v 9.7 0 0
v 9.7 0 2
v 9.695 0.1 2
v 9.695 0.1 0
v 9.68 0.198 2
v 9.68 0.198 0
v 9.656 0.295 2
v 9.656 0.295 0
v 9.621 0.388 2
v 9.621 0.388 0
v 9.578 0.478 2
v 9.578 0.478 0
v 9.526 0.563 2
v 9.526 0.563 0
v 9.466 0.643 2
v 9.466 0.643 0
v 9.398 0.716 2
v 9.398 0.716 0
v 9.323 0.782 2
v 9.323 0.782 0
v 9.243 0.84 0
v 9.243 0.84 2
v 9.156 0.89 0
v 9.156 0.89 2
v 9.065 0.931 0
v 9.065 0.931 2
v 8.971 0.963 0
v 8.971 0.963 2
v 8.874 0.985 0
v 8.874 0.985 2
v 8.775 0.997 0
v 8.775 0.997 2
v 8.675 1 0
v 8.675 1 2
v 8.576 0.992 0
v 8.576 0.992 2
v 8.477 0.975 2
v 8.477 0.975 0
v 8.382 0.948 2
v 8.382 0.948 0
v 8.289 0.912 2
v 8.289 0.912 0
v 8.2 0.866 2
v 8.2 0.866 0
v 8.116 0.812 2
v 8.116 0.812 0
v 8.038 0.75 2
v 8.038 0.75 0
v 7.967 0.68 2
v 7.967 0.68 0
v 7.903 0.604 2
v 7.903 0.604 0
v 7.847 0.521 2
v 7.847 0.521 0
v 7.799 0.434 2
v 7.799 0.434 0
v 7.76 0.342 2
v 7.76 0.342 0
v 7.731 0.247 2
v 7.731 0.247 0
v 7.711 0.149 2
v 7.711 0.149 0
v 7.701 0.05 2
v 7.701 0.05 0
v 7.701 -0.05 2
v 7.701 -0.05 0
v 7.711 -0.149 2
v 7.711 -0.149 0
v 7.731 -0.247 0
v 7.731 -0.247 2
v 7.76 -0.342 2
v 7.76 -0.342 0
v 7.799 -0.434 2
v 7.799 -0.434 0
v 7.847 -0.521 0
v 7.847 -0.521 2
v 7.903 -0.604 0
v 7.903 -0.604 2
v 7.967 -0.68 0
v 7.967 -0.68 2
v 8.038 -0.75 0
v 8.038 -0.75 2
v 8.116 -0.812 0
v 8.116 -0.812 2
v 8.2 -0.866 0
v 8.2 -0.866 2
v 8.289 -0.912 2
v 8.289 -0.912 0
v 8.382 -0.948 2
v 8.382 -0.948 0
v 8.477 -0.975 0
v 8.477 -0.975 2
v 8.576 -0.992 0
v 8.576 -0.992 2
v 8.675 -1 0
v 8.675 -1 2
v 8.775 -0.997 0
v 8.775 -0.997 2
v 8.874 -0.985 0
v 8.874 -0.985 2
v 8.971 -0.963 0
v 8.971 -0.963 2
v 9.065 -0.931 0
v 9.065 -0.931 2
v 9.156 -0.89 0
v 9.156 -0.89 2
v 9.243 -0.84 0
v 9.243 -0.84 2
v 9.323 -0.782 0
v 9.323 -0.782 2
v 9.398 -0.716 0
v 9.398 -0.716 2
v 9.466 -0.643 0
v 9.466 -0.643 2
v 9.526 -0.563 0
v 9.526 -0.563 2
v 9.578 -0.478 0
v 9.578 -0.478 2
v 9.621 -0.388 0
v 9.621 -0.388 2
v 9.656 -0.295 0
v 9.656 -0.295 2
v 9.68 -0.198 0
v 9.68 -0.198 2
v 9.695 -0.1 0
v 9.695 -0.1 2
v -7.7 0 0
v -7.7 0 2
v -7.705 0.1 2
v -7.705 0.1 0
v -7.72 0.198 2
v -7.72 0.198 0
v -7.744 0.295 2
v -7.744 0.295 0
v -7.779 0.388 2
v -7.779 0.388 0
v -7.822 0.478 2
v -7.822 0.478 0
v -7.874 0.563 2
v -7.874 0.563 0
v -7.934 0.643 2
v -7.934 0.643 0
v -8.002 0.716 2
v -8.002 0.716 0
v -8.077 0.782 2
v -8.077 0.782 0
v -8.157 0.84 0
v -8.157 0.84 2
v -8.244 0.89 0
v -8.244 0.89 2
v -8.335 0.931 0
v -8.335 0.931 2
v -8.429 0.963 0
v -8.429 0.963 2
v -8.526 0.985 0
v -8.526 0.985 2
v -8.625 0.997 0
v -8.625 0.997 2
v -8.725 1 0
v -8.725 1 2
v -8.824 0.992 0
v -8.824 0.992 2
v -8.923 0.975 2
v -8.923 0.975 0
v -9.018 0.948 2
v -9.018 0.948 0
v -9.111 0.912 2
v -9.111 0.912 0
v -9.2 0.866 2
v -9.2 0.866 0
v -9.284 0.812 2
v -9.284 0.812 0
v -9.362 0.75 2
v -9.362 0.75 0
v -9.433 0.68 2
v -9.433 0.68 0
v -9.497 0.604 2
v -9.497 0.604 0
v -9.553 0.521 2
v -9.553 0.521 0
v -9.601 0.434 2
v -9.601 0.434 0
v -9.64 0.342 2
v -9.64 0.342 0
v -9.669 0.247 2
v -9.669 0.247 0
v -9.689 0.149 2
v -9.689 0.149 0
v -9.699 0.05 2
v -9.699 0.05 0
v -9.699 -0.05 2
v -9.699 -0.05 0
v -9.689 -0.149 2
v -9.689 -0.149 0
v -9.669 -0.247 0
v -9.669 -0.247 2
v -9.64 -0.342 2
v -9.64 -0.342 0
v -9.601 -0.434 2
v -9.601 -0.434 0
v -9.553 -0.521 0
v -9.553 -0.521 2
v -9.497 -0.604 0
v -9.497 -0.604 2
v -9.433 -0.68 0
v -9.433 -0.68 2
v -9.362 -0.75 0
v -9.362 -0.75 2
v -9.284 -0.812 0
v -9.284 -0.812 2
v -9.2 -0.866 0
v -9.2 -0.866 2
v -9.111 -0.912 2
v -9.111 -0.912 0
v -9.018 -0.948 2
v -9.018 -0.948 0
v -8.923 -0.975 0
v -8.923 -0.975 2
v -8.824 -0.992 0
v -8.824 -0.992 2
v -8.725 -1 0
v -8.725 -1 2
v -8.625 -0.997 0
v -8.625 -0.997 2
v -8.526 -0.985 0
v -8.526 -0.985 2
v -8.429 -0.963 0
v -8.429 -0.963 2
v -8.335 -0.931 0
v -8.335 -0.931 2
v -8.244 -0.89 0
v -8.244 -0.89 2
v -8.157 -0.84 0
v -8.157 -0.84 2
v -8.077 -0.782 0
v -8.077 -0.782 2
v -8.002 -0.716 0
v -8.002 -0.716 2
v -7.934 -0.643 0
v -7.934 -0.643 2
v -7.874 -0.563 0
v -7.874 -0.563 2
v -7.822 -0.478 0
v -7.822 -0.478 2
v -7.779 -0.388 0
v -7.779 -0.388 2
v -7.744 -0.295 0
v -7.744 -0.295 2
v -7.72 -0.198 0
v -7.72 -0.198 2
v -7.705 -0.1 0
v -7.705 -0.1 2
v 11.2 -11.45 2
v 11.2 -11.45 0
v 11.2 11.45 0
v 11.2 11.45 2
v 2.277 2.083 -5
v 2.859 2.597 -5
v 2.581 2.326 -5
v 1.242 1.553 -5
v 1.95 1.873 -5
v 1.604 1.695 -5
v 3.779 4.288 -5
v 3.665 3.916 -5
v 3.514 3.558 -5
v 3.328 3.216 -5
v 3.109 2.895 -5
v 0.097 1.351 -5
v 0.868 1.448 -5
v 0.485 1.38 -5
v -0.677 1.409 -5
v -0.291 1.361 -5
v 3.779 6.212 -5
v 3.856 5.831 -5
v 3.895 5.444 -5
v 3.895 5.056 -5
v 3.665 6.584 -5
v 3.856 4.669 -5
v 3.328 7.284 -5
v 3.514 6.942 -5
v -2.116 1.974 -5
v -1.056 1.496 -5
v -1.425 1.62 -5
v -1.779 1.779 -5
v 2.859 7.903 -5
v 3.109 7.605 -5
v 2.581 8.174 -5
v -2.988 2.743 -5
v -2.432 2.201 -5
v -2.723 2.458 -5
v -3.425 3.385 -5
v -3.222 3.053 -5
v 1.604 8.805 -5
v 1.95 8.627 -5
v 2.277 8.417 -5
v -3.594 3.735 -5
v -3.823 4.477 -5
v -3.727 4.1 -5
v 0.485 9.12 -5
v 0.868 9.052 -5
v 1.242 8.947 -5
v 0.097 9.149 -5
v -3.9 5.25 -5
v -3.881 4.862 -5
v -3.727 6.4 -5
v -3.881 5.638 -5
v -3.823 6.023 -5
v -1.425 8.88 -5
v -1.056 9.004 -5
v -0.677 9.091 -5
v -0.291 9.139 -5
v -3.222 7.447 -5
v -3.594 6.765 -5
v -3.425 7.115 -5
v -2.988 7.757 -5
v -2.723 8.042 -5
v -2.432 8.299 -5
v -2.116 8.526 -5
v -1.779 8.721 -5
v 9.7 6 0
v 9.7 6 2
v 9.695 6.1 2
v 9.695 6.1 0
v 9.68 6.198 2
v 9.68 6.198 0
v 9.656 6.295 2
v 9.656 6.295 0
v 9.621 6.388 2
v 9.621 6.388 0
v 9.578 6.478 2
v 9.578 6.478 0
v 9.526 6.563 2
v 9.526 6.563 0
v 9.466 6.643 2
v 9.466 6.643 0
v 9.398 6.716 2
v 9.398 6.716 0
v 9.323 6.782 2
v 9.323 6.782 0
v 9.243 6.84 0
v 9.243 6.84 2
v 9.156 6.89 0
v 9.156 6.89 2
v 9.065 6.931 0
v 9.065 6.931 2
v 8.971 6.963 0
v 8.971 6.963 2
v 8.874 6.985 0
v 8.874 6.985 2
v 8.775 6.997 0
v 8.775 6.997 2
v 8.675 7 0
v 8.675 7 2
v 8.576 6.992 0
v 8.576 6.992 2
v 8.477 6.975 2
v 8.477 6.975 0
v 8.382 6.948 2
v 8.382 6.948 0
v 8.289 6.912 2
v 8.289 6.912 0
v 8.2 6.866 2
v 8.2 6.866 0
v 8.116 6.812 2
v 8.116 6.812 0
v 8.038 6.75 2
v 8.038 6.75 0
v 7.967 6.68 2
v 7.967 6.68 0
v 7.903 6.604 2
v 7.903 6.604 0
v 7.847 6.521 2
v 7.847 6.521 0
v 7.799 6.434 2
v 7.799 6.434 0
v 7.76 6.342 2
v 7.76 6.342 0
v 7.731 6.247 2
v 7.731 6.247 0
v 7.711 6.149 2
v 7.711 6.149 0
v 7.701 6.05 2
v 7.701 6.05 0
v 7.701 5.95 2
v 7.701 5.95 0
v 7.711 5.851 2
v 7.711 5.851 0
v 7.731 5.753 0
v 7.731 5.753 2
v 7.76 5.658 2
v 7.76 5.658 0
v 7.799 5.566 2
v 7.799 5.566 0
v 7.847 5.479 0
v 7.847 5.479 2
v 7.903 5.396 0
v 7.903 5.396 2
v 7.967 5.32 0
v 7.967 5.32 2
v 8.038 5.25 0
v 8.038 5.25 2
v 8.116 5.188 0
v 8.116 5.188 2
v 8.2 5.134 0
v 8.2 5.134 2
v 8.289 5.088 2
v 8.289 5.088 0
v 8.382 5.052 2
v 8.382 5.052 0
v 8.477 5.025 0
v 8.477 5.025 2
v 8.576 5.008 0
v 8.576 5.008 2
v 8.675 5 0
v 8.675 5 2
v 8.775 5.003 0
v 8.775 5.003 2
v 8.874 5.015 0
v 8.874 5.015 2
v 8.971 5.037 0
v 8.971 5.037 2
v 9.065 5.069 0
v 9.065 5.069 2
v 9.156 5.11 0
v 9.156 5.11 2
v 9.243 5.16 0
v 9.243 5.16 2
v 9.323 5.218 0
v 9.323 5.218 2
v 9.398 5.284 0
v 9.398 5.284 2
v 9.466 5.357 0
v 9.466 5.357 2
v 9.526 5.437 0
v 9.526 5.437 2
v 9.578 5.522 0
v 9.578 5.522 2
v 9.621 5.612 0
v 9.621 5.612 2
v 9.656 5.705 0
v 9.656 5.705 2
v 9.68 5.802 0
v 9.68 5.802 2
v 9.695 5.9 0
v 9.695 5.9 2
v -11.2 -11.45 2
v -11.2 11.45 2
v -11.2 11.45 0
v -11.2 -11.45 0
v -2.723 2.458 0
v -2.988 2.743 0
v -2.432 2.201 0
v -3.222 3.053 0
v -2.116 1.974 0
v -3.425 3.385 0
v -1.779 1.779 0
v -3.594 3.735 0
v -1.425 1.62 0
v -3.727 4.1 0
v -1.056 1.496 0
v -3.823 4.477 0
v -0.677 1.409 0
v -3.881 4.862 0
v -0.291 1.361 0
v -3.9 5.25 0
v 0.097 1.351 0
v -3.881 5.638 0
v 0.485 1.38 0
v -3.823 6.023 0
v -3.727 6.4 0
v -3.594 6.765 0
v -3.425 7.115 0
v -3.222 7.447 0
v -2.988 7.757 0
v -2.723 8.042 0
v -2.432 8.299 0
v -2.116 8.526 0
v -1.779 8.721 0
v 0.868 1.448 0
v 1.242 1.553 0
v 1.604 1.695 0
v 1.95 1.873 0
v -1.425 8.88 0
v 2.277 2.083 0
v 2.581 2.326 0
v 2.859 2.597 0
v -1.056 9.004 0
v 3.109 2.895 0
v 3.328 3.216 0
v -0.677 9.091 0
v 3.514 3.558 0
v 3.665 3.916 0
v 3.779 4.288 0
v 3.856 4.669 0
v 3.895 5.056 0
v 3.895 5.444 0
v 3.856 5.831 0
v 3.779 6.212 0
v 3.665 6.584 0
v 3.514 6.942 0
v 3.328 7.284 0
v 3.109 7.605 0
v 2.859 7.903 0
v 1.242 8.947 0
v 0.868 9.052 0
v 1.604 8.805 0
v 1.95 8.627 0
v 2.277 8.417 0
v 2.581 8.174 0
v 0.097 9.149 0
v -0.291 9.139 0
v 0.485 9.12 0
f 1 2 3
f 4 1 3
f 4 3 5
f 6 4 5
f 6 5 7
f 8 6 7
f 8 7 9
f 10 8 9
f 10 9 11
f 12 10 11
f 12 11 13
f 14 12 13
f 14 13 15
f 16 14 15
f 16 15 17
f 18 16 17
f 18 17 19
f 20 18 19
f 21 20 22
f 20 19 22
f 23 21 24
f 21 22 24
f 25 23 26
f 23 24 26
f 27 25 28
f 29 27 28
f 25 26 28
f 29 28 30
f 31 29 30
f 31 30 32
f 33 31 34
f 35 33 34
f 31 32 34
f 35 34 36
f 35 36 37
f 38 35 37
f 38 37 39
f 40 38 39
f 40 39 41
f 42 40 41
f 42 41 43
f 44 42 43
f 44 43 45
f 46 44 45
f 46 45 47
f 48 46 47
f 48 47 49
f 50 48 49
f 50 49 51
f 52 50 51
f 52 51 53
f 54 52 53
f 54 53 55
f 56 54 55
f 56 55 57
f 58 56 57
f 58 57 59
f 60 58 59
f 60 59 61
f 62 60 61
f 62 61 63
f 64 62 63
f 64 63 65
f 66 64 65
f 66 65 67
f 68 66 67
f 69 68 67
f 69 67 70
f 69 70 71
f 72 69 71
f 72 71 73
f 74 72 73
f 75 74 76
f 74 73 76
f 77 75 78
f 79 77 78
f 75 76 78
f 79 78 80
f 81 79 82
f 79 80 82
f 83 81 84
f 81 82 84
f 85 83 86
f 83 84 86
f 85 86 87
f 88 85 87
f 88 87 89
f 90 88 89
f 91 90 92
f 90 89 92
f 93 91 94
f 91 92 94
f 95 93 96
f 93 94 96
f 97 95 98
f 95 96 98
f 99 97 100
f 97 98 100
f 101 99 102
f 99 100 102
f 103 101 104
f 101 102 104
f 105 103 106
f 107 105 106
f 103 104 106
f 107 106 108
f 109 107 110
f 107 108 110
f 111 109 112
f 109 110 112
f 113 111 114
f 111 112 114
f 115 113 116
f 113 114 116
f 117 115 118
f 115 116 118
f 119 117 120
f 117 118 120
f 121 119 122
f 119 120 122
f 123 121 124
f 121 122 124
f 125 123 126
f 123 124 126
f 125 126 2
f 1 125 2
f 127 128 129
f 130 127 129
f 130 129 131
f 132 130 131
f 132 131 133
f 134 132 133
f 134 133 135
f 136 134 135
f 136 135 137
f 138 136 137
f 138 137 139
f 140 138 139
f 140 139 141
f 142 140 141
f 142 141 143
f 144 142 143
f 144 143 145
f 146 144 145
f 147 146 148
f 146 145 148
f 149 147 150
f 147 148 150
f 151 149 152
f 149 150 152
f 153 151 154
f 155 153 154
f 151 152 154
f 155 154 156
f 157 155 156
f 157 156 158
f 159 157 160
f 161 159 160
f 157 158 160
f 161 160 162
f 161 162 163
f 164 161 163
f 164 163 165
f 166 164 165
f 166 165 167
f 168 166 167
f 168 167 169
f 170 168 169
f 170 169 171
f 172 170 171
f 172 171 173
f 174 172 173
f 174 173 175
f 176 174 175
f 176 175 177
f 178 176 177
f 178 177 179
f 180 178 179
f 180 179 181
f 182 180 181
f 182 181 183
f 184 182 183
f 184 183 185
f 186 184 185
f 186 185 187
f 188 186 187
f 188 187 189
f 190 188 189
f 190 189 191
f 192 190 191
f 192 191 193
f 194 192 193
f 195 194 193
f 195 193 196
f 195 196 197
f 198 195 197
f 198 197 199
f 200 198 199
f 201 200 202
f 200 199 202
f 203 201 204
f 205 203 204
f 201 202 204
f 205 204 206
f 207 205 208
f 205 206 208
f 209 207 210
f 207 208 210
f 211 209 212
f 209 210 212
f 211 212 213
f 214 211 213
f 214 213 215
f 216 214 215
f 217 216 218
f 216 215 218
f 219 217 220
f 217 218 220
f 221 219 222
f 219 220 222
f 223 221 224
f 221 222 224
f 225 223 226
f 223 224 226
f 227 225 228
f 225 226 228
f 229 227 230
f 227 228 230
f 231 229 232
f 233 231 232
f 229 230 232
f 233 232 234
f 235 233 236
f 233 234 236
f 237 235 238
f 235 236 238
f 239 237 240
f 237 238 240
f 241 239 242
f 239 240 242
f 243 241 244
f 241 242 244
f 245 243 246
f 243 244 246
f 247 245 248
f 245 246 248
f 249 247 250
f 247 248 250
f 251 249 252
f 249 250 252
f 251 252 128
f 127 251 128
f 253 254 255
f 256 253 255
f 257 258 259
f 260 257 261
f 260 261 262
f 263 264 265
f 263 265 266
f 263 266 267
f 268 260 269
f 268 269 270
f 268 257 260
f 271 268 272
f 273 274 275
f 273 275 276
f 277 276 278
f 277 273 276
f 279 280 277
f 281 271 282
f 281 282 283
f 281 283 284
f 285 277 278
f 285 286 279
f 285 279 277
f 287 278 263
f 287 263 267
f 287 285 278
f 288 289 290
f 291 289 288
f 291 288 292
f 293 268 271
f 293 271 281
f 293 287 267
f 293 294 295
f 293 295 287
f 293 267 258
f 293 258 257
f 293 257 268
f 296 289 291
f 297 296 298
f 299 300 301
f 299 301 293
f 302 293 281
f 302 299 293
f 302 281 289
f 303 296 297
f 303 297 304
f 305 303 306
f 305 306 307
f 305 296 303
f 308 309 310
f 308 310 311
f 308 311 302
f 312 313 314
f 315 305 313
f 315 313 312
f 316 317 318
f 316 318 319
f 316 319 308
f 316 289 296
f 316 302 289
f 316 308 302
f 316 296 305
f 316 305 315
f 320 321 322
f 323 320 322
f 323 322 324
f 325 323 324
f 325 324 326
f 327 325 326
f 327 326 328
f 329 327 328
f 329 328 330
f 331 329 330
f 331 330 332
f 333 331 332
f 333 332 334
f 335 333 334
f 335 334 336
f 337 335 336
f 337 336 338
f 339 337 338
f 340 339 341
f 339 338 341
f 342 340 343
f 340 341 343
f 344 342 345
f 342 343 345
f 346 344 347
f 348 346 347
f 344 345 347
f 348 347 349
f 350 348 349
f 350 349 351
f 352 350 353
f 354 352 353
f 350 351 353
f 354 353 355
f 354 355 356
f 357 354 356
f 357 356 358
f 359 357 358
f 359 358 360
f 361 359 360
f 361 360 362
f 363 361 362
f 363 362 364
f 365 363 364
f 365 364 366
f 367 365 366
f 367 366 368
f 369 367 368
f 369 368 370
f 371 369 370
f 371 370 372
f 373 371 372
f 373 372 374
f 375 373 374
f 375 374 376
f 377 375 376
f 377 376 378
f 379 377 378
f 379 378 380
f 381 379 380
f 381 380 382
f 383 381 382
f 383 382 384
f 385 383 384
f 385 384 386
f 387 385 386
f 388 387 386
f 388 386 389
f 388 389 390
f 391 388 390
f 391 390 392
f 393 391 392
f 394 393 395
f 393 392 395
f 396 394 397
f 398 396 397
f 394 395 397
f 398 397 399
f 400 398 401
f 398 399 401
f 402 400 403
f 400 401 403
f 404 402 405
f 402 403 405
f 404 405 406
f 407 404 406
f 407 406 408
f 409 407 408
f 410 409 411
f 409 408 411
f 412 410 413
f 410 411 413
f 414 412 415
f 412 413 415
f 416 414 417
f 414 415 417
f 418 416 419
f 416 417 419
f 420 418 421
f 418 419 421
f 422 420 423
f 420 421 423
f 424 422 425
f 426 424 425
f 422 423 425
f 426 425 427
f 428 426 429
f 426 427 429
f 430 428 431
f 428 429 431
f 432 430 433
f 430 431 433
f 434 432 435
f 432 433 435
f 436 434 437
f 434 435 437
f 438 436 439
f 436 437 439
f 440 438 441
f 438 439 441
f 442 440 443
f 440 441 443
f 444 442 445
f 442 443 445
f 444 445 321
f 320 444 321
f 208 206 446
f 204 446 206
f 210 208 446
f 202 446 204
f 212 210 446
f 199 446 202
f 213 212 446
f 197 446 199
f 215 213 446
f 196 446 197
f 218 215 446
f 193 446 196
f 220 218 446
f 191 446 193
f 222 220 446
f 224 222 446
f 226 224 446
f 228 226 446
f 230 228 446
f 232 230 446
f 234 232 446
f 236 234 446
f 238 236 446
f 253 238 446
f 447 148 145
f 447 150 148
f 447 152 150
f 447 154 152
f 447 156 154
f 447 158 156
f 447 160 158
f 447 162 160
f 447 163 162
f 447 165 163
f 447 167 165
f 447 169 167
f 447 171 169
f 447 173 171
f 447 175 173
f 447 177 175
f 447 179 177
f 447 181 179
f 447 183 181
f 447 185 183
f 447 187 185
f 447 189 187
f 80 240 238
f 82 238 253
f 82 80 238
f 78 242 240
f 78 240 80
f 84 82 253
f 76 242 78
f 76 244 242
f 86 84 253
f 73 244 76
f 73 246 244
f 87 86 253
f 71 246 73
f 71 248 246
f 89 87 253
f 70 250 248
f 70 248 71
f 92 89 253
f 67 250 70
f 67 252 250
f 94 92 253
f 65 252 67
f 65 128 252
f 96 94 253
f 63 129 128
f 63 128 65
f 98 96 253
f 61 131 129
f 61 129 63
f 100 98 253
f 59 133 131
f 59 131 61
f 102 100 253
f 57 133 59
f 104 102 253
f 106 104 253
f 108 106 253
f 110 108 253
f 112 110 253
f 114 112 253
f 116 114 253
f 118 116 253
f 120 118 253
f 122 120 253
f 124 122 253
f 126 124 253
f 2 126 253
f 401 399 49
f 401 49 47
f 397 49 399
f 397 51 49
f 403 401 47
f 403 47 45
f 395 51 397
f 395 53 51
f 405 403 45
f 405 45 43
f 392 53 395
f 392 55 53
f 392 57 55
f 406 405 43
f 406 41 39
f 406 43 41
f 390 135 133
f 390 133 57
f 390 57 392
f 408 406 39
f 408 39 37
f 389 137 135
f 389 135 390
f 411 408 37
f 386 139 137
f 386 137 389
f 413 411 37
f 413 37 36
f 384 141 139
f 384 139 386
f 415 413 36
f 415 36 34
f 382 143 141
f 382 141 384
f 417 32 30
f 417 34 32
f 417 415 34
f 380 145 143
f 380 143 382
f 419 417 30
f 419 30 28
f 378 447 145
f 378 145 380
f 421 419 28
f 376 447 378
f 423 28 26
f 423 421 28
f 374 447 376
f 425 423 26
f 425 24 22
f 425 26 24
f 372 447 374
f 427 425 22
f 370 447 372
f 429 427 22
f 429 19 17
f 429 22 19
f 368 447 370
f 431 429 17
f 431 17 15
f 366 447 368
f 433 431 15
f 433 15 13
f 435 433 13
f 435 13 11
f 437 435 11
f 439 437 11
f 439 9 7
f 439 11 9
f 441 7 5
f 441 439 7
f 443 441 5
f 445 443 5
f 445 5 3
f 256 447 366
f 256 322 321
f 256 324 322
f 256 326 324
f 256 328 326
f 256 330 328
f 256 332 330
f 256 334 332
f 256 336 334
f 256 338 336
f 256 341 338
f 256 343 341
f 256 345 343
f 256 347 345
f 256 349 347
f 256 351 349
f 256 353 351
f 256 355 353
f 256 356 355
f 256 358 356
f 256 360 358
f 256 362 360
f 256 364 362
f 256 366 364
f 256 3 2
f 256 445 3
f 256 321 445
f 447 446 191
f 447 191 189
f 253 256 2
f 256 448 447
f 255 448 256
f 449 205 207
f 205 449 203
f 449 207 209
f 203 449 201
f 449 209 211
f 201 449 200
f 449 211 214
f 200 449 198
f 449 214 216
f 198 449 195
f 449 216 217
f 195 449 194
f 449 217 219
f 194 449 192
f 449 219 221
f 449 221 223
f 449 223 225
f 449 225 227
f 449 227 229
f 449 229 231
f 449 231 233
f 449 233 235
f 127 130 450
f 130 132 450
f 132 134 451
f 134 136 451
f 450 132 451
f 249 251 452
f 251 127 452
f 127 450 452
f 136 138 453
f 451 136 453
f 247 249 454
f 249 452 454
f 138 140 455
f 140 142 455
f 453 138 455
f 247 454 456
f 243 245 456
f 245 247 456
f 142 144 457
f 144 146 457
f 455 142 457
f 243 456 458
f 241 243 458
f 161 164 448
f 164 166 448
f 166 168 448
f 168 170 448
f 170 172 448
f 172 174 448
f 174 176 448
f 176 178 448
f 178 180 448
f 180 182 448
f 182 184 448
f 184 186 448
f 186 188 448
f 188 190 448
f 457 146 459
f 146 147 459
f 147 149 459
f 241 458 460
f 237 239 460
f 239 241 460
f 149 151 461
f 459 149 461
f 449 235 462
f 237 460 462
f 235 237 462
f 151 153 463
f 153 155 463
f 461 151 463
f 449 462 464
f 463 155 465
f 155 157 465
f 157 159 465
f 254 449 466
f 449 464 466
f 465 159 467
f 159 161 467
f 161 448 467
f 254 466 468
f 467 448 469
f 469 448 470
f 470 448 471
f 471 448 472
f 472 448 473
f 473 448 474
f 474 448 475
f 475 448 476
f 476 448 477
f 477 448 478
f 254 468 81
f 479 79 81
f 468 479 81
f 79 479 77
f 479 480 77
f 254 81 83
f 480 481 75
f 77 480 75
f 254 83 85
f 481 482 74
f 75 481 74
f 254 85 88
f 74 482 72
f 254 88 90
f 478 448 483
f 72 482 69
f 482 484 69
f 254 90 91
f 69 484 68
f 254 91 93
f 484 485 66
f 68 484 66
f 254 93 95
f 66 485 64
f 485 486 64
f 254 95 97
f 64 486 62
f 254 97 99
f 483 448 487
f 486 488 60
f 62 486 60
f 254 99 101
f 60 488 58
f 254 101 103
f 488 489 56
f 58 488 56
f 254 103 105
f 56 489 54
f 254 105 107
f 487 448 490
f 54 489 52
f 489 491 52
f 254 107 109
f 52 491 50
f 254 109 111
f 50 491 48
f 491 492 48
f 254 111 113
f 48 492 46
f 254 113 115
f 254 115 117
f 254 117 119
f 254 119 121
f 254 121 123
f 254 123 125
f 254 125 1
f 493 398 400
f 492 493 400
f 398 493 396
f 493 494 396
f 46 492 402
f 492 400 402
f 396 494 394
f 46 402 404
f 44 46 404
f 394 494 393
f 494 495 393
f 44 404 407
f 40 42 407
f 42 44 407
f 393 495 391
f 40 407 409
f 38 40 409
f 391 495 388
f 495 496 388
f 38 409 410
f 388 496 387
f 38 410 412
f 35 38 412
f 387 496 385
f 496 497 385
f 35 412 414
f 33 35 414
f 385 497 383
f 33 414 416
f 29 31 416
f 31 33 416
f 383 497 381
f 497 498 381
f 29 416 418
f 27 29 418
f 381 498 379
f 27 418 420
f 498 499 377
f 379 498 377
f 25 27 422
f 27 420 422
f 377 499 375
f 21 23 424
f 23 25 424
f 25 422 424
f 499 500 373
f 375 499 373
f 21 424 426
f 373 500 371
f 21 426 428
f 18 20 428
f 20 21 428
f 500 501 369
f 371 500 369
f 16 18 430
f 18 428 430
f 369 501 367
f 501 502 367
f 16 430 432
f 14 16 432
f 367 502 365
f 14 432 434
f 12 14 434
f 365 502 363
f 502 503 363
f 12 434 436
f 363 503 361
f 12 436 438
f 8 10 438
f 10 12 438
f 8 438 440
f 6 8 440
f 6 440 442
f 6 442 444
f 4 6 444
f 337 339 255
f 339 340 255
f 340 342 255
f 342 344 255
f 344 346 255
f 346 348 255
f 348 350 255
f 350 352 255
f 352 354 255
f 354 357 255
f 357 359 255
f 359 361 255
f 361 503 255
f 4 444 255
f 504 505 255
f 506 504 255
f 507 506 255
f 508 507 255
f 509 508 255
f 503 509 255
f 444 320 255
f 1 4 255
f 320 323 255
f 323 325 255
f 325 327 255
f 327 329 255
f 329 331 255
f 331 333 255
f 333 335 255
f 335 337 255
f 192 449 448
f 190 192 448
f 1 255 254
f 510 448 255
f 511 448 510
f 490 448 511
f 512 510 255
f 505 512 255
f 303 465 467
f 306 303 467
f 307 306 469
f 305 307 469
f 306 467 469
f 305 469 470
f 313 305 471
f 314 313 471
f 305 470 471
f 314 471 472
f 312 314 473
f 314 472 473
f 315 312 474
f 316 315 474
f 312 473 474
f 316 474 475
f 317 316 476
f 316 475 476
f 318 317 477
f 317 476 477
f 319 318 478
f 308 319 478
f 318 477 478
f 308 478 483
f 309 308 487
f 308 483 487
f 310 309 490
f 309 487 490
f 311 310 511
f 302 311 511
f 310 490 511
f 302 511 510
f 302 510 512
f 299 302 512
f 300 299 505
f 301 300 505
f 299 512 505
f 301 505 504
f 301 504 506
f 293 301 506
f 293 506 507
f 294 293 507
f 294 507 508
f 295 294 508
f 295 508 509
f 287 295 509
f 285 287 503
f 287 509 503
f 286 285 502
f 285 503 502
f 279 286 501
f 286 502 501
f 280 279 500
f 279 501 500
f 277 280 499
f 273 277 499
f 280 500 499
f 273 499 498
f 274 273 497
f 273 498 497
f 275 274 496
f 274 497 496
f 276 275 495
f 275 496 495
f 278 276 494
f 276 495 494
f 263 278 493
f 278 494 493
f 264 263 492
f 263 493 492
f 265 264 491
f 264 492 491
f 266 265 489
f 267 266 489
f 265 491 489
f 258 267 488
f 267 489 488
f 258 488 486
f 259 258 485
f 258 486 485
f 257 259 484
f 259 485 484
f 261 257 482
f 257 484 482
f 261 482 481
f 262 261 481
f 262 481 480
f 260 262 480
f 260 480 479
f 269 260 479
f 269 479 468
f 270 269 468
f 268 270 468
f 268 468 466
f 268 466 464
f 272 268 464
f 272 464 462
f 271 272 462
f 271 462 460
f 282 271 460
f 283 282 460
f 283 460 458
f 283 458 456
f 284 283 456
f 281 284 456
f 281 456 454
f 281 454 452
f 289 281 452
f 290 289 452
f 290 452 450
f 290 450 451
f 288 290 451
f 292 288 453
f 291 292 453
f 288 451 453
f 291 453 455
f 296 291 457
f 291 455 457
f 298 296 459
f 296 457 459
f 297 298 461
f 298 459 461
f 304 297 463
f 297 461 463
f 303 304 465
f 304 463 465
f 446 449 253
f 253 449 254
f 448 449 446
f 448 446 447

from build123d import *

# Parameters (mm, degrees)
SKETCH1_W           = 22.4
SKETCH1_H           = 22.9
BOSS_EXTRUDE1_DEPTH = 2
SKETCH2_R           = 1
CUT_EXTRUDE1_DEPTH  = 5
SKETCH4_R           = 3.9
BOSS_EXTRUDE3_DEPTH = 5


with BuildPart() as part:
    # Sketch1 → Boss-Extrude1 (new body)
    with BuildSketch(Plane.XY):
        Rectangle(SKETCH1_W, SKETCH1_H)
    extrude(amount=BOSS_EXTRUDE1_DEPTH)

    # Sketch2 → Cut-Extrude1 (cut)
    with BuildSketch(Plane.XY.offset(2)):
        with Locations((-8.7, 0)):
            Circle(SKETCH2_R)
        with Locations((8.7, 0)):
            Circle(SKETCH2_R)
        with Locations((8.7, 6)):
            Circle(SKETCH2_R)
    extrude(amount=-CUT_EXTRUDE1_DEPTH, mode=Mode.SUBTRACT)

    # Sketch4 → Boss-Extrude3 (add)
    with BuildSketch(Plane(origin=(0, 0, 0), x_dir=(-1, 0, 0), z_dir=(0, 0, -1))):
        with Locations((0, 5.25)):
            Circle(SKETCH4_R)
    extrude(amount=BOSS_EXTRUDE3_DEPTH)


solid = part.part
